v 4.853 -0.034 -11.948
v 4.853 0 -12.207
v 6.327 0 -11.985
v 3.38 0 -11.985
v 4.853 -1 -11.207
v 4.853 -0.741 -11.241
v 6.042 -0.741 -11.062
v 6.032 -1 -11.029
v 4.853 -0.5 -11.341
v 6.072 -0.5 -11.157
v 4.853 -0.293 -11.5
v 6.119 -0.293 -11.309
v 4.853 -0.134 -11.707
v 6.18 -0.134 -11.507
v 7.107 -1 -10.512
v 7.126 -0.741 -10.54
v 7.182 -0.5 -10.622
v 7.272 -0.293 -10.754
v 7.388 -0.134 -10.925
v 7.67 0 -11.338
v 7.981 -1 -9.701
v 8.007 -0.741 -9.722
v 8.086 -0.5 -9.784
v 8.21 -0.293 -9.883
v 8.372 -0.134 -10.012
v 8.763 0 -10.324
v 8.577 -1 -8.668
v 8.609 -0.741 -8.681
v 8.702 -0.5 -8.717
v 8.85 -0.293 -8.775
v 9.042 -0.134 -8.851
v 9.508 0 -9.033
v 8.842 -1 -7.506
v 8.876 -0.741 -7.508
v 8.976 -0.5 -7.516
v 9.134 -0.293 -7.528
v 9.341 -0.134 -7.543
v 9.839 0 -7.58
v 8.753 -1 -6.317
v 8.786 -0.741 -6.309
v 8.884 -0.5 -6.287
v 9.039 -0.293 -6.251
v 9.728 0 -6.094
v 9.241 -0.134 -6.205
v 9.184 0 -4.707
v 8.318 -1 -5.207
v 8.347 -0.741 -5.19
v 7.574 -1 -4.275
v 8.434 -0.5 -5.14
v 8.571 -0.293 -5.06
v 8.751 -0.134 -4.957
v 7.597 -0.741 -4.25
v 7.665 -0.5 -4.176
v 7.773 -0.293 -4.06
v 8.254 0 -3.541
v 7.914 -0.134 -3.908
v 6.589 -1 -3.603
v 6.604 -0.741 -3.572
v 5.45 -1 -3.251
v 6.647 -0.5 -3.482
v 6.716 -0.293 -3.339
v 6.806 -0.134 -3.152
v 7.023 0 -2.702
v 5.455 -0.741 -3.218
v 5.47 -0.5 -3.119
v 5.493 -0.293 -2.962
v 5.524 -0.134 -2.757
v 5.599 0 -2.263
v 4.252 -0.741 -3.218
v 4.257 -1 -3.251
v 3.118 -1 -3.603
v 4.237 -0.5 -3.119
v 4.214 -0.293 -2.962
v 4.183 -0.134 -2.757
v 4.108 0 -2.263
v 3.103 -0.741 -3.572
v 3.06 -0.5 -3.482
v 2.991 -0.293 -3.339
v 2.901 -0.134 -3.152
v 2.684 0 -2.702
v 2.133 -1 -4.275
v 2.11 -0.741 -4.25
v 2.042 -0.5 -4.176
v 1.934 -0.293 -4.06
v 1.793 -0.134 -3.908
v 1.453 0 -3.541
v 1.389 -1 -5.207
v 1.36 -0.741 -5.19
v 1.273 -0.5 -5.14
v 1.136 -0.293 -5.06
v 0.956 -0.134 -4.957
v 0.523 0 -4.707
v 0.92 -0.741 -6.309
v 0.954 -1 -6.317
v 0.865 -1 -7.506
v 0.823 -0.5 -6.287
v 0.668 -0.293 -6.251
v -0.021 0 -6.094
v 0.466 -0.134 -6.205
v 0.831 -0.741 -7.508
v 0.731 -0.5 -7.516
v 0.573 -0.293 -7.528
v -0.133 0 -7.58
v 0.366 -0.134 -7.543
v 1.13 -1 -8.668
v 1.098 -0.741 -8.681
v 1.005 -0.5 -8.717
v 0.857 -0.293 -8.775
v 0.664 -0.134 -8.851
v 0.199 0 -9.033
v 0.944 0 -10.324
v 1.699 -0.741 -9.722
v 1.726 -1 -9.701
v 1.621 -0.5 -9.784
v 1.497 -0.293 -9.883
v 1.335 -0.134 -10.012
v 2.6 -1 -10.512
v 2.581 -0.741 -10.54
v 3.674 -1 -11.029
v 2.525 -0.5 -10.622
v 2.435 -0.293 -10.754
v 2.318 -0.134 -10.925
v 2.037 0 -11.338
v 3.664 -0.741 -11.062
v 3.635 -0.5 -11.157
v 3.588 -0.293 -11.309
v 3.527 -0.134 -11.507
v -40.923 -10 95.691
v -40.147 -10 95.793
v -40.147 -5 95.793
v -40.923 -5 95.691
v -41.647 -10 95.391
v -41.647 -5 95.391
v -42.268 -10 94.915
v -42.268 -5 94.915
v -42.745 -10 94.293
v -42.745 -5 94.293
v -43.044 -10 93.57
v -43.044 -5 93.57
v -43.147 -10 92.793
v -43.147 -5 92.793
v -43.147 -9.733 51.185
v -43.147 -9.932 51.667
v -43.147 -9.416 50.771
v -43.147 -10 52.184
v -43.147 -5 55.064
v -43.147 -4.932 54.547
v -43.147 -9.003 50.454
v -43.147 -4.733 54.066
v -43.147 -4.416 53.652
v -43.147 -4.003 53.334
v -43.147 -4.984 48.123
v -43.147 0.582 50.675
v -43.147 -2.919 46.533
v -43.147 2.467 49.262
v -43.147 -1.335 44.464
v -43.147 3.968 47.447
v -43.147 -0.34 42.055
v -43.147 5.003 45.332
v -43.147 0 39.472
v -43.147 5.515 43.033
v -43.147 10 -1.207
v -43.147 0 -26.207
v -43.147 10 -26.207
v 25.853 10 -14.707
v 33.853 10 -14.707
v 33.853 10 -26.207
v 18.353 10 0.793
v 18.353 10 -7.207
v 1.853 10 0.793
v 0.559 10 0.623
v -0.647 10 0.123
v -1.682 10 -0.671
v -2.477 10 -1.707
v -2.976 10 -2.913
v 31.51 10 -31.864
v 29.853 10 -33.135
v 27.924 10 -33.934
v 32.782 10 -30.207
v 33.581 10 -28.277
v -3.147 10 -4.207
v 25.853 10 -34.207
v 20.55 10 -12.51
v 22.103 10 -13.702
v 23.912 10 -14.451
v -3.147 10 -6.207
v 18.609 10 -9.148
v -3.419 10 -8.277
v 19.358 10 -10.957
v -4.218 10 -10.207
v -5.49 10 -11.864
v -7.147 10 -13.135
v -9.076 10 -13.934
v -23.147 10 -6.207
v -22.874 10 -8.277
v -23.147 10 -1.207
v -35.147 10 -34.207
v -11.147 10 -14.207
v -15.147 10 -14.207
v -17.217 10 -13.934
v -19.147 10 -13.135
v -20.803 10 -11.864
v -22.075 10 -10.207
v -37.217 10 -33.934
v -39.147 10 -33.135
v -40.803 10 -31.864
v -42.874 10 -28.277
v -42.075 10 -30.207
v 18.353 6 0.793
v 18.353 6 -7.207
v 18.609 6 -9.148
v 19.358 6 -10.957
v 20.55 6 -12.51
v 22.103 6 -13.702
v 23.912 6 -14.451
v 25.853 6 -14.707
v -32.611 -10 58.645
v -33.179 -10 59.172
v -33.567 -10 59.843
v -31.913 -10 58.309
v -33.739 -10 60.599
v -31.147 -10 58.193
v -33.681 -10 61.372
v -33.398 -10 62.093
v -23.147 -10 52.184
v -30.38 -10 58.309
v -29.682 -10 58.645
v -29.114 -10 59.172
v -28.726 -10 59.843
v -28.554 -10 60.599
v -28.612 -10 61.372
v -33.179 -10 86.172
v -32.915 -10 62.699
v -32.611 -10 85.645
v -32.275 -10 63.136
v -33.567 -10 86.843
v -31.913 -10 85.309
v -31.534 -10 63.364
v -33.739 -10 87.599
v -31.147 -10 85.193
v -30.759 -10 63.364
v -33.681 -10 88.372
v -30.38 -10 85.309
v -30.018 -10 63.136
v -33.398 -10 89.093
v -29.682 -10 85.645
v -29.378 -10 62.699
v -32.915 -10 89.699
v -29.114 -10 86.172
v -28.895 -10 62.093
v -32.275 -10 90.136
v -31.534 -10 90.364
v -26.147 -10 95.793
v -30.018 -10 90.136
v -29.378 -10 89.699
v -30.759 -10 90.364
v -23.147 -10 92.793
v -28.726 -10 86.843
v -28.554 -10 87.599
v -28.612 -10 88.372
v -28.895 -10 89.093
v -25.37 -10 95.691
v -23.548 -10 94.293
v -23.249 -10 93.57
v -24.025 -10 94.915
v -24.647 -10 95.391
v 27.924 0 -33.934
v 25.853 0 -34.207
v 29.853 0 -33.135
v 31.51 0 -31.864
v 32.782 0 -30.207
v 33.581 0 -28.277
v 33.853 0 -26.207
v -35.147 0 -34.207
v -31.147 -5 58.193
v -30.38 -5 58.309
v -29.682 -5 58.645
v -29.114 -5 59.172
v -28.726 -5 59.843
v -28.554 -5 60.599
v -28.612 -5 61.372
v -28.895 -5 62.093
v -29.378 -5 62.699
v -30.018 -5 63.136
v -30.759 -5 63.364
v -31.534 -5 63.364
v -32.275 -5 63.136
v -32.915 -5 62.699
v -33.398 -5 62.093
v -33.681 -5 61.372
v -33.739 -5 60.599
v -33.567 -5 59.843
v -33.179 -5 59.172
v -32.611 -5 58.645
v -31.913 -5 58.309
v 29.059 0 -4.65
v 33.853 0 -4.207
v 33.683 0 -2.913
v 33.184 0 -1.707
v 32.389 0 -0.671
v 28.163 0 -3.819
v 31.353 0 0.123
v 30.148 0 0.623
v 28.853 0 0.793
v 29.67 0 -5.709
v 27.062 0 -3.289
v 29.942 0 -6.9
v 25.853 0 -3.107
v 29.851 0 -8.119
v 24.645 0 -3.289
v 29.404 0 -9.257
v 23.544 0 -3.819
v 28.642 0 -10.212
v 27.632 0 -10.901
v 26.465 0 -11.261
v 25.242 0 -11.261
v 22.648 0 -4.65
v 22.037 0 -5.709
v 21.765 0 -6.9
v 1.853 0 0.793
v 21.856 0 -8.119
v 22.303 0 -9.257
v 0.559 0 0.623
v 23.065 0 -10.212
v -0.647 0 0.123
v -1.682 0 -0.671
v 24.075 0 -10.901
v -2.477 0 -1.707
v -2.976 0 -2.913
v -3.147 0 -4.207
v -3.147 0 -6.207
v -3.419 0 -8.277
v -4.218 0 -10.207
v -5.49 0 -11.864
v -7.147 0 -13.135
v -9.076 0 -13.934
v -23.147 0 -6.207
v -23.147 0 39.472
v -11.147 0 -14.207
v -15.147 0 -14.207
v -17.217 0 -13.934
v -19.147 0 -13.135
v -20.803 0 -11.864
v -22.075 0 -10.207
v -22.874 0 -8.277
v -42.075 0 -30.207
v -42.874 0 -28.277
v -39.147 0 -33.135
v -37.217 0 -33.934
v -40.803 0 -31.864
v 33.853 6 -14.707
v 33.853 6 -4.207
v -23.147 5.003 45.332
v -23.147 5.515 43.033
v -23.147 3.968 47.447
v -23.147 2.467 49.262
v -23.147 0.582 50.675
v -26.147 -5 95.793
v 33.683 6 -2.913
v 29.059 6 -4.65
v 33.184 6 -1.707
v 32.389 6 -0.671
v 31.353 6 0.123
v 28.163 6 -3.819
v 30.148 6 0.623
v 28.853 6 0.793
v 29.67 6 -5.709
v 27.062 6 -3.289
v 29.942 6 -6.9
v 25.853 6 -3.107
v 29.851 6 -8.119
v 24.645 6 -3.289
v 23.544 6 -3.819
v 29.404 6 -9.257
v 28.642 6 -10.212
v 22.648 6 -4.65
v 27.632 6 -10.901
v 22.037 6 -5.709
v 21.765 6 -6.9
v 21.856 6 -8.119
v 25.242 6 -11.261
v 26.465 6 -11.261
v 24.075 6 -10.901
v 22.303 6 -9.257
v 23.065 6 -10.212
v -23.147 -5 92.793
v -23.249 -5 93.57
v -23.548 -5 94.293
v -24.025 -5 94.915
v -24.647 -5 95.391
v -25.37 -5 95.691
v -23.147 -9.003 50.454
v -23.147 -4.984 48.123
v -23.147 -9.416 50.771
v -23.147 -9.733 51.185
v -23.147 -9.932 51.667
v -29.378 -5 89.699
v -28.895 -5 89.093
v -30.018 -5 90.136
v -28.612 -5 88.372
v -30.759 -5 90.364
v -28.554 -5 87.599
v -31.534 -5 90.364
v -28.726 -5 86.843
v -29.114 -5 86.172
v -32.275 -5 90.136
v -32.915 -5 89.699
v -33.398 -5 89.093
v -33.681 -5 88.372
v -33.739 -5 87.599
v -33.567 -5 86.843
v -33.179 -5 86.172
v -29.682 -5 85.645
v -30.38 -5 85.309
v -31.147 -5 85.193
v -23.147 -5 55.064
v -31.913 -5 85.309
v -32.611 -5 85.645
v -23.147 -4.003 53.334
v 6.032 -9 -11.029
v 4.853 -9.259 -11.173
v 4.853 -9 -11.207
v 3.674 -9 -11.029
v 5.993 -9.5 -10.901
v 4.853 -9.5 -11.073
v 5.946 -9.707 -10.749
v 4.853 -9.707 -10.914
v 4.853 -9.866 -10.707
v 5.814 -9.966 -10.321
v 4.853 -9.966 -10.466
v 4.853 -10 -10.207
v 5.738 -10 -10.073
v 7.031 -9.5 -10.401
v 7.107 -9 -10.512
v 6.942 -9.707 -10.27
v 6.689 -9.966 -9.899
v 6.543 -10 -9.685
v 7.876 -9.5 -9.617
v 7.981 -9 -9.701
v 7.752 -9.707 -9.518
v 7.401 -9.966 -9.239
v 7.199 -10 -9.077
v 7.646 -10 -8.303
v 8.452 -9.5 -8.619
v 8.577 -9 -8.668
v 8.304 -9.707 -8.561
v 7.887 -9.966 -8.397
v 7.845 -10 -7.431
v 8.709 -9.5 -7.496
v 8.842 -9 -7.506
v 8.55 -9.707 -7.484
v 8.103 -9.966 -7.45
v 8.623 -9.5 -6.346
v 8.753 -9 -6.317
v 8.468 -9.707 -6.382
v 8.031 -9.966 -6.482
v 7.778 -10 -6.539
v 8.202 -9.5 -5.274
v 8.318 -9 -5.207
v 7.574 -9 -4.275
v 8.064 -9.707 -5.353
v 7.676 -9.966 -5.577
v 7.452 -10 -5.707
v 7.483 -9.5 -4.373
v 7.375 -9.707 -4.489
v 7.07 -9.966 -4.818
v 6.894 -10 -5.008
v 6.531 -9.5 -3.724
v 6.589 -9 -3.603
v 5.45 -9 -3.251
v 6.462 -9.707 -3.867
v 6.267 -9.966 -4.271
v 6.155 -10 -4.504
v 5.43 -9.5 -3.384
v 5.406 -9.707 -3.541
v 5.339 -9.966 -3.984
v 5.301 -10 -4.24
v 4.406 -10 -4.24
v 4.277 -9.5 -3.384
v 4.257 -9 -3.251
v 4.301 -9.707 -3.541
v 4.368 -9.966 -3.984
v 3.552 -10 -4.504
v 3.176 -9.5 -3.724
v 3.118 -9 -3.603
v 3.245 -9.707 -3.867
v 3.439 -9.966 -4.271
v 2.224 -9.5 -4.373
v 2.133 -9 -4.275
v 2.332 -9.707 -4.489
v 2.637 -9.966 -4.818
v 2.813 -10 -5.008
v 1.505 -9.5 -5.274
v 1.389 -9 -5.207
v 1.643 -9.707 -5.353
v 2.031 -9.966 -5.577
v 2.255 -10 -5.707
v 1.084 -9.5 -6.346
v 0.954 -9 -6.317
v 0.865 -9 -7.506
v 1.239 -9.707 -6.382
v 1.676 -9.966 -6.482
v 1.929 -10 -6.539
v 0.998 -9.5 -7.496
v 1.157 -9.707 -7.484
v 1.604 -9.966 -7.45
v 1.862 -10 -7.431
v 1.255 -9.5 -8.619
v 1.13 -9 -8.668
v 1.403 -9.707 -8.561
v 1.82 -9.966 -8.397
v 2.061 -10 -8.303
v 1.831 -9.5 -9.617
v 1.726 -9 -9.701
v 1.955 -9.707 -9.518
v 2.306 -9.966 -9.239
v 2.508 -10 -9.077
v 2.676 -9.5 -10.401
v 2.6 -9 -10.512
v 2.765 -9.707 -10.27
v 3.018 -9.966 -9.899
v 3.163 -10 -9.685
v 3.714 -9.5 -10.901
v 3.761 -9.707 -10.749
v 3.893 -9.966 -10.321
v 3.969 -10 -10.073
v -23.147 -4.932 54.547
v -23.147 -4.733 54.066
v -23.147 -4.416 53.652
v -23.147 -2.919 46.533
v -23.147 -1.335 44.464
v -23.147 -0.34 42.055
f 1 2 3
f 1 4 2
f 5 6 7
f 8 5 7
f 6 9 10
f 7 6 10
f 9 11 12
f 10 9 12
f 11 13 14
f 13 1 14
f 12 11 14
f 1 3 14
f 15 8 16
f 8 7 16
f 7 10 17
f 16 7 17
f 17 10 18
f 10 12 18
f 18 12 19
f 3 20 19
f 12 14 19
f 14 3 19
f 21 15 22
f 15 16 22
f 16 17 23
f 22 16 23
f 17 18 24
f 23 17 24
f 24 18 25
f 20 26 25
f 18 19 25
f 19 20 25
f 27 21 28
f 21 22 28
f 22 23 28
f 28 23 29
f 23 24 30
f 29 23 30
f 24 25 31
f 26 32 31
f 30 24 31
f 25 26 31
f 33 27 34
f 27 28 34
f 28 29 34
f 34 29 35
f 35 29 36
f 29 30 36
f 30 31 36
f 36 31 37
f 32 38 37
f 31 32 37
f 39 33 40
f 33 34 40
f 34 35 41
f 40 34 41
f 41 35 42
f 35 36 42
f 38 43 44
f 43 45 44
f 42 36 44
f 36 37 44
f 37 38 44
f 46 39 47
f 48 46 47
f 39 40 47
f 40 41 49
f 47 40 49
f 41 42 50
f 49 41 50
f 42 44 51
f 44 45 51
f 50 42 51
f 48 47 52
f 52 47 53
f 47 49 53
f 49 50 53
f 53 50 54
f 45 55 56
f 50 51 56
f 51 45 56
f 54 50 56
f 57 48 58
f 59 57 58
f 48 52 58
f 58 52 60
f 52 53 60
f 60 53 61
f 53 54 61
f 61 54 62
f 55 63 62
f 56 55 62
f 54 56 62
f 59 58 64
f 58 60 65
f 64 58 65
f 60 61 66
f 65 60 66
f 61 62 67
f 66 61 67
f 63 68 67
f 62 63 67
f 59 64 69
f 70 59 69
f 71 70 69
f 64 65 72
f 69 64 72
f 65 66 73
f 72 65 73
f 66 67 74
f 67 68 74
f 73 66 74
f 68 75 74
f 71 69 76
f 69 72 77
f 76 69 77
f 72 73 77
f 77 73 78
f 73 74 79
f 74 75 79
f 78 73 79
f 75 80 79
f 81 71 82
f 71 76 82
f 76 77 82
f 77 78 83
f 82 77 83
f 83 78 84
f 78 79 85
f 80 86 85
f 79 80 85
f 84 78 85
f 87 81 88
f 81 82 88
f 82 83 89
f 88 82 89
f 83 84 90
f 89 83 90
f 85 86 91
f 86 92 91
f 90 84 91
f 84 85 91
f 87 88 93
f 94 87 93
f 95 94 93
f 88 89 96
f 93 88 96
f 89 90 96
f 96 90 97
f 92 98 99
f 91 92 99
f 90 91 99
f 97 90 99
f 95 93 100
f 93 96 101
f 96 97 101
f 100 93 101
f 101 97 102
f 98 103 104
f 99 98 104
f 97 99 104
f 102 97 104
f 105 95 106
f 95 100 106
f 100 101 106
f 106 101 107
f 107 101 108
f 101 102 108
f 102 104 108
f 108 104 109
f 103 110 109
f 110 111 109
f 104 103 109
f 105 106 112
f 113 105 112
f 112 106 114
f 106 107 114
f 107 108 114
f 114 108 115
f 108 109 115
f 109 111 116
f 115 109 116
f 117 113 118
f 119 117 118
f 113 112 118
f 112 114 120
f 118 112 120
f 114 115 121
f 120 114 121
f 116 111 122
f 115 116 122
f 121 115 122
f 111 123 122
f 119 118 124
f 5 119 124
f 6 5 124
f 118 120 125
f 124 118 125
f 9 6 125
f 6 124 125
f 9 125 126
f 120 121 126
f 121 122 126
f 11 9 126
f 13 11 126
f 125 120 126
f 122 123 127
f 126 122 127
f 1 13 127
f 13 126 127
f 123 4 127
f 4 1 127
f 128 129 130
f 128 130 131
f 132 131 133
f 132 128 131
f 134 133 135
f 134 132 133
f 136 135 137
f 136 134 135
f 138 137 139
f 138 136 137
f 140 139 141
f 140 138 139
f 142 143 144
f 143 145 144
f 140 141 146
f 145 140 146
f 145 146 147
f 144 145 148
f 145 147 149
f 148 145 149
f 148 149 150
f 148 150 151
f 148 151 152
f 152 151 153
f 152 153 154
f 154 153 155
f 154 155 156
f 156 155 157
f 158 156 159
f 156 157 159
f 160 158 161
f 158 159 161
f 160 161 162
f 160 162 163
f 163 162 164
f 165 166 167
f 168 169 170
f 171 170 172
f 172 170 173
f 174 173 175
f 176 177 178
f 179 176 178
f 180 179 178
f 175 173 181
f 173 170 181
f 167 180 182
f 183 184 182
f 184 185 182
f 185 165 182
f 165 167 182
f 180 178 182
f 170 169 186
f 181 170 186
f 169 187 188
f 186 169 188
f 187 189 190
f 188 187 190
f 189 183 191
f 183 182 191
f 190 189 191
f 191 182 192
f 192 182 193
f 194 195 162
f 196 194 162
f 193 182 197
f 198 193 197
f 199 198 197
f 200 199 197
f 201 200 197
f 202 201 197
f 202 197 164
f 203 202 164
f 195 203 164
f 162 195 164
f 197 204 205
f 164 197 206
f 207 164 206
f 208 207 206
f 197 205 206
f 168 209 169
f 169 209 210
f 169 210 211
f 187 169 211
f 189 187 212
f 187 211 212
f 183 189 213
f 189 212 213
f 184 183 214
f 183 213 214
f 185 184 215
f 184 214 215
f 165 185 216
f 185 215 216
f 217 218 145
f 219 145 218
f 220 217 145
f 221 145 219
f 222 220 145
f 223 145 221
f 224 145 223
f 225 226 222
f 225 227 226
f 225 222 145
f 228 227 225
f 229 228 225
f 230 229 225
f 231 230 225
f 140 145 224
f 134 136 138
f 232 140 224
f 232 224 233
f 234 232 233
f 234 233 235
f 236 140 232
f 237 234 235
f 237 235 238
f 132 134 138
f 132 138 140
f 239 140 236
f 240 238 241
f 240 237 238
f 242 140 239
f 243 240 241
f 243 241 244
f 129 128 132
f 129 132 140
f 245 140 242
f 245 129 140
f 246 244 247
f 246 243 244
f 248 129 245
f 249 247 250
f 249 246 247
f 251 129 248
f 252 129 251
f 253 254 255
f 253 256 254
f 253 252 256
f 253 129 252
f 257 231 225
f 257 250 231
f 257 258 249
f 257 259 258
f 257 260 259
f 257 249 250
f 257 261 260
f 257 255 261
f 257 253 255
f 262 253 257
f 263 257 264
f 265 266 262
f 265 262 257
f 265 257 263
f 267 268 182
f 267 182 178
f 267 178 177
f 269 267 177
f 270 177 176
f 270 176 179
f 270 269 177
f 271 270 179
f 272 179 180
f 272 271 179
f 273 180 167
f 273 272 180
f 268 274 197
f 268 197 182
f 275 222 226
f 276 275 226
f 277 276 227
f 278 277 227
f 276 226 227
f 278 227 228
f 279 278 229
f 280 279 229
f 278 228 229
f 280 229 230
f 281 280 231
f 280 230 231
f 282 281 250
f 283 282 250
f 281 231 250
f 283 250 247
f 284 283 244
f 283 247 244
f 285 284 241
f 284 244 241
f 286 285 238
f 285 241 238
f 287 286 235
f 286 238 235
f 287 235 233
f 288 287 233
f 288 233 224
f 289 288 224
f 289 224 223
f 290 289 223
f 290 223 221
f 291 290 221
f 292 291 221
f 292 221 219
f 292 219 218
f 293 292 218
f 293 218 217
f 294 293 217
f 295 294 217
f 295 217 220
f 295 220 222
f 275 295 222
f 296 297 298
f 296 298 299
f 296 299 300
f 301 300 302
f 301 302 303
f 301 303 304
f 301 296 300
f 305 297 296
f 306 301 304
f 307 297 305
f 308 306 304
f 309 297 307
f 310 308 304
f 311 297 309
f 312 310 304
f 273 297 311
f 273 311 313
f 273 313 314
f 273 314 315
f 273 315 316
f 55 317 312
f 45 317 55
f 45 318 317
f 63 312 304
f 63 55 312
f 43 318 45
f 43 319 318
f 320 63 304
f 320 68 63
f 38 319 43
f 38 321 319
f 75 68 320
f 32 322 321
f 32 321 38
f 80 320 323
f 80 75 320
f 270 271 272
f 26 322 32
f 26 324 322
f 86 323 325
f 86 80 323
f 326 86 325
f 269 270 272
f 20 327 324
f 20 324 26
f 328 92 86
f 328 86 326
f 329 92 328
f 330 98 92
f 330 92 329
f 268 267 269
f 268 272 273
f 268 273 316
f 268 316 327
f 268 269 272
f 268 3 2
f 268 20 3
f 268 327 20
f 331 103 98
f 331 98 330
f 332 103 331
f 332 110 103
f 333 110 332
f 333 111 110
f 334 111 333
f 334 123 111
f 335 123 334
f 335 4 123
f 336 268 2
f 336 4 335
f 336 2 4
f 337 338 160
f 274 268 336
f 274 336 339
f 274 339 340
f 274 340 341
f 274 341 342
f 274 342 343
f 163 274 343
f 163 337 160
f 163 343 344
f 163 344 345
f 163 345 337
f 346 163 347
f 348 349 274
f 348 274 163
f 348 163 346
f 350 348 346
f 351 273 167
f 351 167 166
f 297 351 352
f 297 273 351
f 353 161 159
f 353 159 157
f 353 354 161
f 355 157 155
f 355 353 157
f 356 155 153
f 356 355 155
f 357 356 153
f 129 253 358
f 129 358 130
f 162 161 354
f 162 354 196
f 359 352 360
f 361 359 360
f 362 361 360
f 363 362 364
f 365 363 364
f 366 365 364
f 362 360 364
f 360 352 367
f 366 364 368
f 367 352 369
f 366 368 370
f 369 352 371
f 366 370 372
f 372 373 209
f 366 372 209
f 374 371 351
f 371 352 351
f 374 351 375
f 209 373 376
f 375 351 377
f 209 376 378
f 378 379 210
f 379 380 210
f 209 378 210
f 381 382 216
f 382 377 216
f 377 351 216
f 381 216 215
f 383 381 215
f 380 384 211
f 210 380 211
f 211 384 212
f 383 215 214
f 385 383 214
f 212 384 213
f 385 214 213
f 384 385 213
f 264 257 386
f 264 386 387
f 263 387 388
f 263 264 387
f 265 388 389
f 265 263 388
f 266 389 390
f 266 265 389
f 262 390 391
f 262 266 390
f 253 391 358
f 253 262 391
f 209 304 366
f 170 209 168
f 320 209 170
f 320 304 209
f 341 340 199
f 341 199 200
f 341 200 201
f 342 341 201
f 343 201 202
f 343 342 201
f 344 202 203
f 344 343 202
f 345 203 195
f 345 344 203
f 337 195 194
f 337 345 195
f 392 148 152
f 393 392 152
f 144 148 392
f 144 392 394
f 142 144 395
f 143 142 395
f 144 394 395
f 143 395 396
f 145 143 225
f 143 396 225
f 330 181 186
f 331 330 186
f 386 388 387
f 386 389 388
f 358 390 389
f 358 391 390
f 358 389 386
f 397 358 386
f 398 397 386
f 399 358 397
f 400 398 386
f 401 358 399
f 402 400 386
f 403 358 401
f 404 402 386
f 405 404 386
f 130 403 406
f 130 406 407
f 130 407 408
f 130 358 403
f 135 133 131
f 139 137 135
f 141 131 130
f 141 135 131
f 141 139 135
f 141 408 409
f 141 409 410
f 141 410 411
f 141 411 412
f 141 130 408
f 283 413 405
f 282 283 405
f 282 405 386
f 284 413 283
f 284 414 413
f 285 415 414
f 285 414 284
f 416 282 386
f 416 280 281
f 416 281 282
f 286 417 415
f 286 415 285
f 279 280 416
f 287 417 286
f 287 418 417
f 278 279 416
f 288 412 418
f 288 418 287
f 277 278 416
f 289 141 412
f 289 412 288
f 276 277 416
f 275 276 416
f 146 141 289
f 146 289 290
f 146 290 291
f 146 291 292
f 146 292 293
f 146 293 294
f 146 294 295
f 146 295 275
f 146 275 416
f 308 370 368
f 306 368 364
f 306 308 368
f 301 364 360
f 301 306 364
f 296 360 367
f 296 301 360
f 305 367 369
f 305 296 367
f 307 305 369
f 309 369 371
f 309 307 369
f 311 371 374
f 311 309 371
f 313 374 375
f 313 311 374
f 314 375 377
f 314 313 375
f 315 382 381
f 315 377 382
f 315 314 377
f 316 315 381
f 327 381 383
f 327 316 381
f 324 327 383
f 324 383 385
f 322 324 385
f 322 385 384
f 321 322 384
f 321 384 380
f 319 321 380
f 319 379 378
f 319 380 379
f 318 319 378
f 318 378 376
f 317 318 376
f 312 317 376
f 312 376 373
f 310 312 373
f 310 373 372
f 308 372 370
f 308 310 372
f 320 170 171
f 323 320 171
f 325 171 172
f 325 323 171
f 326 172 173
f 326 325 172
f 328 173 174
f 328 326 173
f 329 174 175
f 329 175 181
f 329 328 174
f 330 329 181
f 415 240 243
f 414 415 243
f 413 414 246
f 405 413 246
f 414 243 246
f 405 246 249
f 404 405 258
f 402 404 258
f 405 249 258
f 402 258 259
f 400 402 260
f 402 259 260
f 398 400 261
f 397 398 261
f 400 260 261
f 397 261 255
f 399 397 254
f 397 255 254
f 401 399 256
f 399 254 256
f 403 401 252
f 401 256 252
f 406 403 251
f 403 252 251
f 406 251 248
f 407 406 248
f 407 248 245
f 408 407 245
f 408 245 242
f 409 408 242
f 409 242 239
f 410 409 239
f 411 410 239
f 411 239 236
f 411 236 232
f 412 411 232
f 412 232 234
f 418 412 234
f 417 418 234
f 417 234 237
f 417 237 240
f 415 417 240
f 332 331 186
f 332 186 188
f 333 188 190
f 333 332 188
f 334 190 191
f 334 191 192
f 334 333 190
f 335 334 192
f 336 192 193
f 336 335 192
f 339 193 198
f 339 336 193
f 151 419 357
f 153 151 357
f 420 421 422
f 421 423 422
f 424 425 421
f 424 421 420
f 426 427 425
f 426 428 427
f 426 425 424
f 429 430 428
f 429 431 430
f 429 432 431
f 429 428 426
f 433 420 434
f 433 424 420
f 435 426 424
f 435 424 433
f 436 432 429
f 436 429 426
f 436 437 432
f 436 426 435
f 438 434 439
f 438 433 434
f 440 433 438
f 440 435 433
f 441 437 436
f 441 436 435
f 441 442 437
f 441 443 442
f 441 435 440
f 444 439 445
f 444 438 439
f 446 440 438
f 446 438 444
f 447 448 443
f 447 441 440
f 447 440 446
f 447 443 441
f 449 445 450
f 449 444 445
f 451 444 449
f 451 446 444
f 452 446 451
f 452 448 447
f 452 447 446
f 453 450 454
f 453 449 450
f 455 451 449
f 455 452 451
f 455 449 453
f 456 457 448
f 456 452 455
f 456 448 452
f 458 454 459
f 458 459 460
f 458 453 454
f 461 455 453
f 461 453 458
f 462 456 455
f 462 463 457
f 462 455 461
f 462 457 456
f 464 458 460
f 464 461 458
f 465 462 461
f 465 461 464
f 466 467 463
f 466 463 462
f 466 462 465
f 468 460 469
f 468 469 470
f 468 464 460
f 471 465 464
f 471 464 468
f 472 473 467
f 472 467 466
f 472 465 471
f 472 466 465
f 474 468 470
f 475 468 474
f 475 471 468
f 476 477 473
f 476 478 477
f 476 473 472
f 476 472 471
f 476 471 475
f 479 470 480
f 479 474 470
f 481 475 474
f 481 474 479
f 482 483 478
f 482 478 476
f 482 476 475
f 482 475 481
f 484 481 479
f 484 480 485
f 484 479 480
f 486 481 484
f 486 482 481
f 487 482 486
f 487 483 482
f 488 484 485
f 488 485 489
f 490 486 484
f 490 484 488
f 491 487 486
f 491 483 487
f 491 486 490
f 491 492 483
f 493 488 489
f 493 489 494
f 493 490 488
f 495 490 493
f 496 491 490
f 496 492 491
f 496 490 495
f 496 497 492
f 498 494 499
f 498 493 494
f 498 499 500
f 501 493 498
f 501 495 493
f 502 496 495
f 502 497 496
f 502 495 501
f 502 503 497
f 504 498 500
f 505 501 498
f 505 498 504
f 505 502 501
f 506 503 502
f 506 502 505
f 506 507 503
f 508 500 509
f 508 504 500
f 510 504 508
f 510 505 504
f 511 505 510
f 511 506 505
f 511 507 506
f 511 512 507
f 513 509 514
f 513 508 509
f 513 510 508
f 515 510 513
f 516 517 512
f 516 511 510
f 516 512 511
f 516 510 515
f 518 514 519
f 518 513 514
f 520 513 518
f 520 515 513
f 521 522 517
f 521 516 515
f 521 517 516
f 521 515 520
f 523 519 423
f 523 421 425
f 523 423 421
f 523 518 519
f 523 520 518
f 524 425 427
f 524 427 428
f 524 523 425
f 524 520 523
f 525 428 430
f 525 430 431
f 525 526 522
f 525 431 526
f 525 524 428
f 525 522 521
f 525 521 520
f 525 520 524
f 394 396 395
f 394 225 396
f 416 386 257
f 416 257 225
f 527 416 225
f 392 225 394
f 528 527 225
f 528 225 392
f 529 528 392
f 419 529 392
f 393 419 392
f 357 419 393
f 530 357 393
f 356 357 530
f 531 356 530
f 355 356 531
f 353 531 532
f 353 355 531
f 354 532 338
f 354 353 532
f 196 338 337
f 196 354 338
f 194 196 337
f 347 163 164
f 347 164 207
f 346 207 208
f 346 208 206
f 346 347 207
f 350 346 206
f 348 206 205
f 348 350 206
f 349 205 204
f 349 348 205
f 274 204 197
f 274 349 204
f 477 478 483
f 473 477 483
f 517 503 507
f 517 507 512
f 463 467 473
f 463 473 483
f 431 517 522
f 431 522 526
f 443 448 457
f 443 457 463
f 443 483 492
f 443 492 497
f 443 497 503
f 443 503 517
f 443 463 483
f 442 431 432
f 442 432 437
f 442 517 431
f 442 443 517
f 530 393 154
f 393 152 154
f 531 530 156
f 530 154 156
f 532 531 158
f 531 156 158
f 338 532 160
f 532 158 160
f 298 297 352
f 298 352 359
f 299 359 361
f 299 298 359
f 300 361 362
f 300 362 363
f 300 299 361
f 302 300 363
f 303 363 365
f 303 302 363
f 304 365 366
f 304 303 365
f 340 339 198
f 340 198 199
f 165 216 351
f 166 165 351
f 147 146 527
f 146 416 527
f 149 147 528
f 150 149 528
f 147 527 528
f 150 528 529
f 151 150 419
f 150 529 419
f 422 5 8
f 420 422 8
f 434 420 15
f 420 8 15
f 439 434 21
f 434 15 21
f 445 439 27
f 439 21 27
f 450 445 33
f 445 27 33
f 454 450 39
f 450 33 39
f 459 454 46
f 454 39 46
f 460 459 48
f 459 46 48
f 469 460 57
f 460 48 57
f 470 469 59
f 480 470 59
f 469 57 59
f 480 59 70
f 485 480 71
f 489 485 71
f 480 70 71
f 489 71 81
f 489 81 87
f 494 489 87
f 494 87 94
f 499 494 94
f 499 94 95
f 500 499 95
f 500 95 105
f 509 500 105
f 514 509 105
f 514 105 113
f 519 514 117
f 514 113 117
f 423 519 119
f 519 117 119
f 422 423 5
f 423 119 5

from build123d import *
from build123d.topology import SkipClean

# Parameters (mm, degrees)
SKETCH1_R                = 4.1
SKETCH1_R_2              = 4
SKETCH1_R_3              = 2.6
BOSS_EXTRUDE1_DEPTH      = 10
CUT_EXTRUDE1_START       = -4
CUT_EXTRUDE1_DEPTH       = 4
BOSS_EXTRUDE2_DEPTH      = 10
BOSS_EXTRUDE2_DEPTH_BACK = 10
SKETCH5_R                = 4
FILLET1_R                = 1
BOSS_EXTRUDE3_START      = 10
SKETCH6_R                = 2.6
BOSS_EXTRUDE3_DEPTH      = 10
BOSS_EXTRUDE4_DEPTH      = 20
CUT_EXTRUDE2_REACH       = 125.31
FILLET2_R                = 10
FILLET3_R                = 2


with BuildPart() as part:
    # Sketch1 → Boss-Extrude1 (new body)
    with BuildSketch(Plane(origin=(0, 0, 0), x_dir=(1, 0, 0), z_dir=(0, 1, 0))):
        with BuildLine():
            Line((28.853428594, -0.793287448), (1.853428594, -0.793287448))
            ThreePointArc((1.853428594, -0.793287448), (-1.682105312, 0.671178646), (-3.146571406, 4.206712552))
            Line((-3.146571406, 4.206712552), (-3.146571406, 6.206712552))
            ThreePointArc((-3.146571406, 6.206712552), (-5.489717157, 11.863566801), (-11.146571406, 14.206712552))
            Line((-11.146571406, 14.206712552), (-15.146571406, 14.206712552))
            ThreePointArc((-15.146571406, 14.206712552), (-20.803425656, 11.863566801), (-23.146571406, 6.206712552))
            Line((-23.146571406, 6.206712552), (-23.146571406, -92.793287448))
            ThreePointArc((-23.146571406, -92.793287448), (-24.025251062, -94.914607792), (-26.146571406, -95.793287448))
            Line((-26.146571406, -95.793287448), (-40.146571406, -95.793287448))
            ThreePointArc((-40.146571406, -95.793287448), (-42.26789175, -94.914607792), (-43.146571406, -92.793287448))
            Line((-43.146571406, -92.793287448), (-43.146571406, 4.206712552))
            Line((-43.146571406, 4.206712552), (-43.146571406, 26.206712552))
            ThreePointArc((-43.146571406, 26.206712552), (-40.803425656, 31.863566801), (-35.146571406, 34.206712552))
            Line((-35.146571406, 34.206712552), (-3.146571406, 34.206712552))
            Line((-3.146571406, 34.206712552), (25.853428594, 34.206712552))
            ThreePointArc((25.853428594, 34.206712552), (31.510282843, 31.863566801), (33.853428594, 26.206712552))
            Line((33.853428594, 26.206712552), (33.853428594, 4.206712552))
            ThreePointArc((33.853428594, 4.206712552), (32.3889625, 0.671178646), (28.853428594, -0.793287448))
        make_face()
        with Locations(Location((25.853428594, 7.206712552, 0), (0, 0, 270))):
            Circle(SKETCH1_R, mode=Mode.SUBTRACT)
        with Locations(Location((4.853428594, 7.206712552, 0), (0, 0, 270))):
            Circle(SKETCH1_R_2, mode=Mode.SUBTRACT)
        with Locations(Location((-31.146571406, -87.793287448, 0), (0, 0, 270))):
            Circle(SKETCH1_R_3, mode=Mode.SUBTRACT)
        with Locations(Location((-31.146571406, -60.793287448, 0), (0, 0, 270))):
            Circle(SKETCH1_R_3, mode=Mode.SUBTRACT)
    extrude(amount=BOSS_EXTRUDE1_DEPTH)

    # Sketch2 → Cut-Extrude1 (cut)
    with BuildSketch(Plane(origin=(0, 10, 0), x_dir=(1, 0, 0), z_dir=(0, 1, 0)).offset(CUT_EXTRUDE1_START)):
        with BuildLine():
            Line((25.853428594, 14.706712552), (33.853428594, 14.706712552))
            Line((33.853428594, 14.706712552), (33.853428594, 4.206712552))
            ThreePointArc((33.853428594, 4.206712552), (32.3889625, 0.671178646), (28.853428594, -0.793287448))
            Line((28.853428594, -0.793287448), (18.353428594, -0.793287448))
            Line((18.353428594, -0.793287448), (18.353428594, 7.206712552))
            ThreePointArc((18.353428594, 7.206712552), (20.550127735, 12.510013411), (25.853428594, 14.706712552))
        make_face()
    extrude(amount=CUT_EXTRUDE1_DEPTH, mode=Mode.SUBTRACT)

    # Sketch5 → Boss-Extrude2 (add, two sides: drawn at the far end of the back side and taken through both)
    with BuildSketch(Plane(origin=(0, 0, 0), x_dir=(-1, 0, 0), z_dir=(0, -1, 0)).offset(-BOSS_EXTRUDE2_DEPTH_BACK)):
        with Locations(Location((-4.853428594, 7.206712552, 0), (0, 0, 90))):
            Circle(SKETCH5_R)
    extrude(amount=BOSS_EXTRUDE2_DEPTH + BOSS_EXTRUDE2_DEPTH_BACK)

    # Fillet1
    fillet1_edges = [part.edges().sort_by_distance(p)[0] for p in [
        (4.853428594, 0, -3.206712552),
        (4.853428594, -10, -3.206712552),
    ]]
    fillet(fillet1_edges, radius=FILLET1_R)

    # Sketch6 → Boss-Extrude3 (add)
    with SkipClean():  # the faces are left unmerged after this step: merging them gives an invalid solid
        with BuildSketch(Plane.XZ.offset(BOSS_EXTRUDE3_START)):
            with BuildLine():
                Line((-26.146571406, 95.793287448), (-40.146571406, 95.793287448))
                ThreePointArc((-40.146571406, 95.793287448), (-42.26789175, 94.914607792), (-43.146571406, 92.793287448))
                Line((-43.146571406, 92.793287448), (-43.146571406, 51.031484515))
                Line((-43.146571406, 51.031484515), (-23.146571406, 51.031484515))
                Line((-23.146571406, 51.031484515), (-23.146571406, 92.793287448))
                ThreePointArc((-23.146571406, 92.793287448), (-24.025251062, 94.914607792), (-26.146571406, 95.793287448))
            make_face()
            with Locations(Location((-31.146571406, 87.793287448, 0), (0, 0, 270))):
                Circle(SKETCH6_R, mode=Mode.SUBTRACT)
            with Locations(Location((-31.146571406, 60.793287448, 0), (0, 0, 270))):
                Circle(SKETCH6_R, mode=Mode.SUBTRACT)
        extrude(amount=-BOSS_EXTRUDE3_DEPTH)

    # Sketch7 → Boss-Extrude4 (add)
    with SkipClean():  # the faces are left unmerged after this step: merging them gives an invalid solid
        with BuildSketch(Plane(origin=(-23.146571406, 0, 0), x_dir=(0, 0, -1), z_dir=(1, 0, 0))):
            Polygon((-51.031484515, -10), (-45.232749266, 0), (-51.031484515, 0), align=None)
        extrude(amount=-BOSS_EXTRUDE4_DEPTH)

    # Cut-Extrude2: up to this face of the body (flat: up to its plane)
    cut_extrude2_end = Plane(part.part.faces().sort_by_distance((-23.146571406, 5, 43.293287448))[0])
    # Sketch8 → Cut-Extrude2 (cut, up to the picked face)
    with BuildSketch(Plane.ZY.offset(43.146571406), mode=Mode.PRIVATE) as cut_extrude2_sk1:
        Polygon((53.911938049, -5), (48.1132028, 5), (-1.206712552, 10), (103.677305794, 10), (103.677305794, -5), align=None)
    cut_extrude2_tool1 = split(extrude(cut_extrude2_sk1.sketch, amount=-CUT_EXTRUDE2_REACH, mode=Mode.PRIVATE), bisect_by=cut_extrude2_end, keep=Keep.BOTH, mode=Mode.PRIVATE)
    add(cut_extrude2_tool1.solids().sort_by(Axis((-43.146571, 3.405459, 70.825985), (1, 0, 0)))[0], mode=Mode.SUBTRACT)

    # Fillet2
    fillet2_edges = [part.edges().sort_by_distance(p)[0] for p in [
        (-33.146571406, 0, 45.232749266),
        (-33.146571406, 5, 48.1132028),
    ]]
    fillet(fillet2_edges, radius=FILLET2_R)

    # Fillet3
    fillet3_edges = [part.edges().sort_by_distance(p)[0] for p in [
        (-33.146571406, -10, 51.031484515),
        (-33.146571406, -5, 53.911938049),
    ]]
    fillet(fillet3_edges, radius=FILLET3_R)


solid = part.part
